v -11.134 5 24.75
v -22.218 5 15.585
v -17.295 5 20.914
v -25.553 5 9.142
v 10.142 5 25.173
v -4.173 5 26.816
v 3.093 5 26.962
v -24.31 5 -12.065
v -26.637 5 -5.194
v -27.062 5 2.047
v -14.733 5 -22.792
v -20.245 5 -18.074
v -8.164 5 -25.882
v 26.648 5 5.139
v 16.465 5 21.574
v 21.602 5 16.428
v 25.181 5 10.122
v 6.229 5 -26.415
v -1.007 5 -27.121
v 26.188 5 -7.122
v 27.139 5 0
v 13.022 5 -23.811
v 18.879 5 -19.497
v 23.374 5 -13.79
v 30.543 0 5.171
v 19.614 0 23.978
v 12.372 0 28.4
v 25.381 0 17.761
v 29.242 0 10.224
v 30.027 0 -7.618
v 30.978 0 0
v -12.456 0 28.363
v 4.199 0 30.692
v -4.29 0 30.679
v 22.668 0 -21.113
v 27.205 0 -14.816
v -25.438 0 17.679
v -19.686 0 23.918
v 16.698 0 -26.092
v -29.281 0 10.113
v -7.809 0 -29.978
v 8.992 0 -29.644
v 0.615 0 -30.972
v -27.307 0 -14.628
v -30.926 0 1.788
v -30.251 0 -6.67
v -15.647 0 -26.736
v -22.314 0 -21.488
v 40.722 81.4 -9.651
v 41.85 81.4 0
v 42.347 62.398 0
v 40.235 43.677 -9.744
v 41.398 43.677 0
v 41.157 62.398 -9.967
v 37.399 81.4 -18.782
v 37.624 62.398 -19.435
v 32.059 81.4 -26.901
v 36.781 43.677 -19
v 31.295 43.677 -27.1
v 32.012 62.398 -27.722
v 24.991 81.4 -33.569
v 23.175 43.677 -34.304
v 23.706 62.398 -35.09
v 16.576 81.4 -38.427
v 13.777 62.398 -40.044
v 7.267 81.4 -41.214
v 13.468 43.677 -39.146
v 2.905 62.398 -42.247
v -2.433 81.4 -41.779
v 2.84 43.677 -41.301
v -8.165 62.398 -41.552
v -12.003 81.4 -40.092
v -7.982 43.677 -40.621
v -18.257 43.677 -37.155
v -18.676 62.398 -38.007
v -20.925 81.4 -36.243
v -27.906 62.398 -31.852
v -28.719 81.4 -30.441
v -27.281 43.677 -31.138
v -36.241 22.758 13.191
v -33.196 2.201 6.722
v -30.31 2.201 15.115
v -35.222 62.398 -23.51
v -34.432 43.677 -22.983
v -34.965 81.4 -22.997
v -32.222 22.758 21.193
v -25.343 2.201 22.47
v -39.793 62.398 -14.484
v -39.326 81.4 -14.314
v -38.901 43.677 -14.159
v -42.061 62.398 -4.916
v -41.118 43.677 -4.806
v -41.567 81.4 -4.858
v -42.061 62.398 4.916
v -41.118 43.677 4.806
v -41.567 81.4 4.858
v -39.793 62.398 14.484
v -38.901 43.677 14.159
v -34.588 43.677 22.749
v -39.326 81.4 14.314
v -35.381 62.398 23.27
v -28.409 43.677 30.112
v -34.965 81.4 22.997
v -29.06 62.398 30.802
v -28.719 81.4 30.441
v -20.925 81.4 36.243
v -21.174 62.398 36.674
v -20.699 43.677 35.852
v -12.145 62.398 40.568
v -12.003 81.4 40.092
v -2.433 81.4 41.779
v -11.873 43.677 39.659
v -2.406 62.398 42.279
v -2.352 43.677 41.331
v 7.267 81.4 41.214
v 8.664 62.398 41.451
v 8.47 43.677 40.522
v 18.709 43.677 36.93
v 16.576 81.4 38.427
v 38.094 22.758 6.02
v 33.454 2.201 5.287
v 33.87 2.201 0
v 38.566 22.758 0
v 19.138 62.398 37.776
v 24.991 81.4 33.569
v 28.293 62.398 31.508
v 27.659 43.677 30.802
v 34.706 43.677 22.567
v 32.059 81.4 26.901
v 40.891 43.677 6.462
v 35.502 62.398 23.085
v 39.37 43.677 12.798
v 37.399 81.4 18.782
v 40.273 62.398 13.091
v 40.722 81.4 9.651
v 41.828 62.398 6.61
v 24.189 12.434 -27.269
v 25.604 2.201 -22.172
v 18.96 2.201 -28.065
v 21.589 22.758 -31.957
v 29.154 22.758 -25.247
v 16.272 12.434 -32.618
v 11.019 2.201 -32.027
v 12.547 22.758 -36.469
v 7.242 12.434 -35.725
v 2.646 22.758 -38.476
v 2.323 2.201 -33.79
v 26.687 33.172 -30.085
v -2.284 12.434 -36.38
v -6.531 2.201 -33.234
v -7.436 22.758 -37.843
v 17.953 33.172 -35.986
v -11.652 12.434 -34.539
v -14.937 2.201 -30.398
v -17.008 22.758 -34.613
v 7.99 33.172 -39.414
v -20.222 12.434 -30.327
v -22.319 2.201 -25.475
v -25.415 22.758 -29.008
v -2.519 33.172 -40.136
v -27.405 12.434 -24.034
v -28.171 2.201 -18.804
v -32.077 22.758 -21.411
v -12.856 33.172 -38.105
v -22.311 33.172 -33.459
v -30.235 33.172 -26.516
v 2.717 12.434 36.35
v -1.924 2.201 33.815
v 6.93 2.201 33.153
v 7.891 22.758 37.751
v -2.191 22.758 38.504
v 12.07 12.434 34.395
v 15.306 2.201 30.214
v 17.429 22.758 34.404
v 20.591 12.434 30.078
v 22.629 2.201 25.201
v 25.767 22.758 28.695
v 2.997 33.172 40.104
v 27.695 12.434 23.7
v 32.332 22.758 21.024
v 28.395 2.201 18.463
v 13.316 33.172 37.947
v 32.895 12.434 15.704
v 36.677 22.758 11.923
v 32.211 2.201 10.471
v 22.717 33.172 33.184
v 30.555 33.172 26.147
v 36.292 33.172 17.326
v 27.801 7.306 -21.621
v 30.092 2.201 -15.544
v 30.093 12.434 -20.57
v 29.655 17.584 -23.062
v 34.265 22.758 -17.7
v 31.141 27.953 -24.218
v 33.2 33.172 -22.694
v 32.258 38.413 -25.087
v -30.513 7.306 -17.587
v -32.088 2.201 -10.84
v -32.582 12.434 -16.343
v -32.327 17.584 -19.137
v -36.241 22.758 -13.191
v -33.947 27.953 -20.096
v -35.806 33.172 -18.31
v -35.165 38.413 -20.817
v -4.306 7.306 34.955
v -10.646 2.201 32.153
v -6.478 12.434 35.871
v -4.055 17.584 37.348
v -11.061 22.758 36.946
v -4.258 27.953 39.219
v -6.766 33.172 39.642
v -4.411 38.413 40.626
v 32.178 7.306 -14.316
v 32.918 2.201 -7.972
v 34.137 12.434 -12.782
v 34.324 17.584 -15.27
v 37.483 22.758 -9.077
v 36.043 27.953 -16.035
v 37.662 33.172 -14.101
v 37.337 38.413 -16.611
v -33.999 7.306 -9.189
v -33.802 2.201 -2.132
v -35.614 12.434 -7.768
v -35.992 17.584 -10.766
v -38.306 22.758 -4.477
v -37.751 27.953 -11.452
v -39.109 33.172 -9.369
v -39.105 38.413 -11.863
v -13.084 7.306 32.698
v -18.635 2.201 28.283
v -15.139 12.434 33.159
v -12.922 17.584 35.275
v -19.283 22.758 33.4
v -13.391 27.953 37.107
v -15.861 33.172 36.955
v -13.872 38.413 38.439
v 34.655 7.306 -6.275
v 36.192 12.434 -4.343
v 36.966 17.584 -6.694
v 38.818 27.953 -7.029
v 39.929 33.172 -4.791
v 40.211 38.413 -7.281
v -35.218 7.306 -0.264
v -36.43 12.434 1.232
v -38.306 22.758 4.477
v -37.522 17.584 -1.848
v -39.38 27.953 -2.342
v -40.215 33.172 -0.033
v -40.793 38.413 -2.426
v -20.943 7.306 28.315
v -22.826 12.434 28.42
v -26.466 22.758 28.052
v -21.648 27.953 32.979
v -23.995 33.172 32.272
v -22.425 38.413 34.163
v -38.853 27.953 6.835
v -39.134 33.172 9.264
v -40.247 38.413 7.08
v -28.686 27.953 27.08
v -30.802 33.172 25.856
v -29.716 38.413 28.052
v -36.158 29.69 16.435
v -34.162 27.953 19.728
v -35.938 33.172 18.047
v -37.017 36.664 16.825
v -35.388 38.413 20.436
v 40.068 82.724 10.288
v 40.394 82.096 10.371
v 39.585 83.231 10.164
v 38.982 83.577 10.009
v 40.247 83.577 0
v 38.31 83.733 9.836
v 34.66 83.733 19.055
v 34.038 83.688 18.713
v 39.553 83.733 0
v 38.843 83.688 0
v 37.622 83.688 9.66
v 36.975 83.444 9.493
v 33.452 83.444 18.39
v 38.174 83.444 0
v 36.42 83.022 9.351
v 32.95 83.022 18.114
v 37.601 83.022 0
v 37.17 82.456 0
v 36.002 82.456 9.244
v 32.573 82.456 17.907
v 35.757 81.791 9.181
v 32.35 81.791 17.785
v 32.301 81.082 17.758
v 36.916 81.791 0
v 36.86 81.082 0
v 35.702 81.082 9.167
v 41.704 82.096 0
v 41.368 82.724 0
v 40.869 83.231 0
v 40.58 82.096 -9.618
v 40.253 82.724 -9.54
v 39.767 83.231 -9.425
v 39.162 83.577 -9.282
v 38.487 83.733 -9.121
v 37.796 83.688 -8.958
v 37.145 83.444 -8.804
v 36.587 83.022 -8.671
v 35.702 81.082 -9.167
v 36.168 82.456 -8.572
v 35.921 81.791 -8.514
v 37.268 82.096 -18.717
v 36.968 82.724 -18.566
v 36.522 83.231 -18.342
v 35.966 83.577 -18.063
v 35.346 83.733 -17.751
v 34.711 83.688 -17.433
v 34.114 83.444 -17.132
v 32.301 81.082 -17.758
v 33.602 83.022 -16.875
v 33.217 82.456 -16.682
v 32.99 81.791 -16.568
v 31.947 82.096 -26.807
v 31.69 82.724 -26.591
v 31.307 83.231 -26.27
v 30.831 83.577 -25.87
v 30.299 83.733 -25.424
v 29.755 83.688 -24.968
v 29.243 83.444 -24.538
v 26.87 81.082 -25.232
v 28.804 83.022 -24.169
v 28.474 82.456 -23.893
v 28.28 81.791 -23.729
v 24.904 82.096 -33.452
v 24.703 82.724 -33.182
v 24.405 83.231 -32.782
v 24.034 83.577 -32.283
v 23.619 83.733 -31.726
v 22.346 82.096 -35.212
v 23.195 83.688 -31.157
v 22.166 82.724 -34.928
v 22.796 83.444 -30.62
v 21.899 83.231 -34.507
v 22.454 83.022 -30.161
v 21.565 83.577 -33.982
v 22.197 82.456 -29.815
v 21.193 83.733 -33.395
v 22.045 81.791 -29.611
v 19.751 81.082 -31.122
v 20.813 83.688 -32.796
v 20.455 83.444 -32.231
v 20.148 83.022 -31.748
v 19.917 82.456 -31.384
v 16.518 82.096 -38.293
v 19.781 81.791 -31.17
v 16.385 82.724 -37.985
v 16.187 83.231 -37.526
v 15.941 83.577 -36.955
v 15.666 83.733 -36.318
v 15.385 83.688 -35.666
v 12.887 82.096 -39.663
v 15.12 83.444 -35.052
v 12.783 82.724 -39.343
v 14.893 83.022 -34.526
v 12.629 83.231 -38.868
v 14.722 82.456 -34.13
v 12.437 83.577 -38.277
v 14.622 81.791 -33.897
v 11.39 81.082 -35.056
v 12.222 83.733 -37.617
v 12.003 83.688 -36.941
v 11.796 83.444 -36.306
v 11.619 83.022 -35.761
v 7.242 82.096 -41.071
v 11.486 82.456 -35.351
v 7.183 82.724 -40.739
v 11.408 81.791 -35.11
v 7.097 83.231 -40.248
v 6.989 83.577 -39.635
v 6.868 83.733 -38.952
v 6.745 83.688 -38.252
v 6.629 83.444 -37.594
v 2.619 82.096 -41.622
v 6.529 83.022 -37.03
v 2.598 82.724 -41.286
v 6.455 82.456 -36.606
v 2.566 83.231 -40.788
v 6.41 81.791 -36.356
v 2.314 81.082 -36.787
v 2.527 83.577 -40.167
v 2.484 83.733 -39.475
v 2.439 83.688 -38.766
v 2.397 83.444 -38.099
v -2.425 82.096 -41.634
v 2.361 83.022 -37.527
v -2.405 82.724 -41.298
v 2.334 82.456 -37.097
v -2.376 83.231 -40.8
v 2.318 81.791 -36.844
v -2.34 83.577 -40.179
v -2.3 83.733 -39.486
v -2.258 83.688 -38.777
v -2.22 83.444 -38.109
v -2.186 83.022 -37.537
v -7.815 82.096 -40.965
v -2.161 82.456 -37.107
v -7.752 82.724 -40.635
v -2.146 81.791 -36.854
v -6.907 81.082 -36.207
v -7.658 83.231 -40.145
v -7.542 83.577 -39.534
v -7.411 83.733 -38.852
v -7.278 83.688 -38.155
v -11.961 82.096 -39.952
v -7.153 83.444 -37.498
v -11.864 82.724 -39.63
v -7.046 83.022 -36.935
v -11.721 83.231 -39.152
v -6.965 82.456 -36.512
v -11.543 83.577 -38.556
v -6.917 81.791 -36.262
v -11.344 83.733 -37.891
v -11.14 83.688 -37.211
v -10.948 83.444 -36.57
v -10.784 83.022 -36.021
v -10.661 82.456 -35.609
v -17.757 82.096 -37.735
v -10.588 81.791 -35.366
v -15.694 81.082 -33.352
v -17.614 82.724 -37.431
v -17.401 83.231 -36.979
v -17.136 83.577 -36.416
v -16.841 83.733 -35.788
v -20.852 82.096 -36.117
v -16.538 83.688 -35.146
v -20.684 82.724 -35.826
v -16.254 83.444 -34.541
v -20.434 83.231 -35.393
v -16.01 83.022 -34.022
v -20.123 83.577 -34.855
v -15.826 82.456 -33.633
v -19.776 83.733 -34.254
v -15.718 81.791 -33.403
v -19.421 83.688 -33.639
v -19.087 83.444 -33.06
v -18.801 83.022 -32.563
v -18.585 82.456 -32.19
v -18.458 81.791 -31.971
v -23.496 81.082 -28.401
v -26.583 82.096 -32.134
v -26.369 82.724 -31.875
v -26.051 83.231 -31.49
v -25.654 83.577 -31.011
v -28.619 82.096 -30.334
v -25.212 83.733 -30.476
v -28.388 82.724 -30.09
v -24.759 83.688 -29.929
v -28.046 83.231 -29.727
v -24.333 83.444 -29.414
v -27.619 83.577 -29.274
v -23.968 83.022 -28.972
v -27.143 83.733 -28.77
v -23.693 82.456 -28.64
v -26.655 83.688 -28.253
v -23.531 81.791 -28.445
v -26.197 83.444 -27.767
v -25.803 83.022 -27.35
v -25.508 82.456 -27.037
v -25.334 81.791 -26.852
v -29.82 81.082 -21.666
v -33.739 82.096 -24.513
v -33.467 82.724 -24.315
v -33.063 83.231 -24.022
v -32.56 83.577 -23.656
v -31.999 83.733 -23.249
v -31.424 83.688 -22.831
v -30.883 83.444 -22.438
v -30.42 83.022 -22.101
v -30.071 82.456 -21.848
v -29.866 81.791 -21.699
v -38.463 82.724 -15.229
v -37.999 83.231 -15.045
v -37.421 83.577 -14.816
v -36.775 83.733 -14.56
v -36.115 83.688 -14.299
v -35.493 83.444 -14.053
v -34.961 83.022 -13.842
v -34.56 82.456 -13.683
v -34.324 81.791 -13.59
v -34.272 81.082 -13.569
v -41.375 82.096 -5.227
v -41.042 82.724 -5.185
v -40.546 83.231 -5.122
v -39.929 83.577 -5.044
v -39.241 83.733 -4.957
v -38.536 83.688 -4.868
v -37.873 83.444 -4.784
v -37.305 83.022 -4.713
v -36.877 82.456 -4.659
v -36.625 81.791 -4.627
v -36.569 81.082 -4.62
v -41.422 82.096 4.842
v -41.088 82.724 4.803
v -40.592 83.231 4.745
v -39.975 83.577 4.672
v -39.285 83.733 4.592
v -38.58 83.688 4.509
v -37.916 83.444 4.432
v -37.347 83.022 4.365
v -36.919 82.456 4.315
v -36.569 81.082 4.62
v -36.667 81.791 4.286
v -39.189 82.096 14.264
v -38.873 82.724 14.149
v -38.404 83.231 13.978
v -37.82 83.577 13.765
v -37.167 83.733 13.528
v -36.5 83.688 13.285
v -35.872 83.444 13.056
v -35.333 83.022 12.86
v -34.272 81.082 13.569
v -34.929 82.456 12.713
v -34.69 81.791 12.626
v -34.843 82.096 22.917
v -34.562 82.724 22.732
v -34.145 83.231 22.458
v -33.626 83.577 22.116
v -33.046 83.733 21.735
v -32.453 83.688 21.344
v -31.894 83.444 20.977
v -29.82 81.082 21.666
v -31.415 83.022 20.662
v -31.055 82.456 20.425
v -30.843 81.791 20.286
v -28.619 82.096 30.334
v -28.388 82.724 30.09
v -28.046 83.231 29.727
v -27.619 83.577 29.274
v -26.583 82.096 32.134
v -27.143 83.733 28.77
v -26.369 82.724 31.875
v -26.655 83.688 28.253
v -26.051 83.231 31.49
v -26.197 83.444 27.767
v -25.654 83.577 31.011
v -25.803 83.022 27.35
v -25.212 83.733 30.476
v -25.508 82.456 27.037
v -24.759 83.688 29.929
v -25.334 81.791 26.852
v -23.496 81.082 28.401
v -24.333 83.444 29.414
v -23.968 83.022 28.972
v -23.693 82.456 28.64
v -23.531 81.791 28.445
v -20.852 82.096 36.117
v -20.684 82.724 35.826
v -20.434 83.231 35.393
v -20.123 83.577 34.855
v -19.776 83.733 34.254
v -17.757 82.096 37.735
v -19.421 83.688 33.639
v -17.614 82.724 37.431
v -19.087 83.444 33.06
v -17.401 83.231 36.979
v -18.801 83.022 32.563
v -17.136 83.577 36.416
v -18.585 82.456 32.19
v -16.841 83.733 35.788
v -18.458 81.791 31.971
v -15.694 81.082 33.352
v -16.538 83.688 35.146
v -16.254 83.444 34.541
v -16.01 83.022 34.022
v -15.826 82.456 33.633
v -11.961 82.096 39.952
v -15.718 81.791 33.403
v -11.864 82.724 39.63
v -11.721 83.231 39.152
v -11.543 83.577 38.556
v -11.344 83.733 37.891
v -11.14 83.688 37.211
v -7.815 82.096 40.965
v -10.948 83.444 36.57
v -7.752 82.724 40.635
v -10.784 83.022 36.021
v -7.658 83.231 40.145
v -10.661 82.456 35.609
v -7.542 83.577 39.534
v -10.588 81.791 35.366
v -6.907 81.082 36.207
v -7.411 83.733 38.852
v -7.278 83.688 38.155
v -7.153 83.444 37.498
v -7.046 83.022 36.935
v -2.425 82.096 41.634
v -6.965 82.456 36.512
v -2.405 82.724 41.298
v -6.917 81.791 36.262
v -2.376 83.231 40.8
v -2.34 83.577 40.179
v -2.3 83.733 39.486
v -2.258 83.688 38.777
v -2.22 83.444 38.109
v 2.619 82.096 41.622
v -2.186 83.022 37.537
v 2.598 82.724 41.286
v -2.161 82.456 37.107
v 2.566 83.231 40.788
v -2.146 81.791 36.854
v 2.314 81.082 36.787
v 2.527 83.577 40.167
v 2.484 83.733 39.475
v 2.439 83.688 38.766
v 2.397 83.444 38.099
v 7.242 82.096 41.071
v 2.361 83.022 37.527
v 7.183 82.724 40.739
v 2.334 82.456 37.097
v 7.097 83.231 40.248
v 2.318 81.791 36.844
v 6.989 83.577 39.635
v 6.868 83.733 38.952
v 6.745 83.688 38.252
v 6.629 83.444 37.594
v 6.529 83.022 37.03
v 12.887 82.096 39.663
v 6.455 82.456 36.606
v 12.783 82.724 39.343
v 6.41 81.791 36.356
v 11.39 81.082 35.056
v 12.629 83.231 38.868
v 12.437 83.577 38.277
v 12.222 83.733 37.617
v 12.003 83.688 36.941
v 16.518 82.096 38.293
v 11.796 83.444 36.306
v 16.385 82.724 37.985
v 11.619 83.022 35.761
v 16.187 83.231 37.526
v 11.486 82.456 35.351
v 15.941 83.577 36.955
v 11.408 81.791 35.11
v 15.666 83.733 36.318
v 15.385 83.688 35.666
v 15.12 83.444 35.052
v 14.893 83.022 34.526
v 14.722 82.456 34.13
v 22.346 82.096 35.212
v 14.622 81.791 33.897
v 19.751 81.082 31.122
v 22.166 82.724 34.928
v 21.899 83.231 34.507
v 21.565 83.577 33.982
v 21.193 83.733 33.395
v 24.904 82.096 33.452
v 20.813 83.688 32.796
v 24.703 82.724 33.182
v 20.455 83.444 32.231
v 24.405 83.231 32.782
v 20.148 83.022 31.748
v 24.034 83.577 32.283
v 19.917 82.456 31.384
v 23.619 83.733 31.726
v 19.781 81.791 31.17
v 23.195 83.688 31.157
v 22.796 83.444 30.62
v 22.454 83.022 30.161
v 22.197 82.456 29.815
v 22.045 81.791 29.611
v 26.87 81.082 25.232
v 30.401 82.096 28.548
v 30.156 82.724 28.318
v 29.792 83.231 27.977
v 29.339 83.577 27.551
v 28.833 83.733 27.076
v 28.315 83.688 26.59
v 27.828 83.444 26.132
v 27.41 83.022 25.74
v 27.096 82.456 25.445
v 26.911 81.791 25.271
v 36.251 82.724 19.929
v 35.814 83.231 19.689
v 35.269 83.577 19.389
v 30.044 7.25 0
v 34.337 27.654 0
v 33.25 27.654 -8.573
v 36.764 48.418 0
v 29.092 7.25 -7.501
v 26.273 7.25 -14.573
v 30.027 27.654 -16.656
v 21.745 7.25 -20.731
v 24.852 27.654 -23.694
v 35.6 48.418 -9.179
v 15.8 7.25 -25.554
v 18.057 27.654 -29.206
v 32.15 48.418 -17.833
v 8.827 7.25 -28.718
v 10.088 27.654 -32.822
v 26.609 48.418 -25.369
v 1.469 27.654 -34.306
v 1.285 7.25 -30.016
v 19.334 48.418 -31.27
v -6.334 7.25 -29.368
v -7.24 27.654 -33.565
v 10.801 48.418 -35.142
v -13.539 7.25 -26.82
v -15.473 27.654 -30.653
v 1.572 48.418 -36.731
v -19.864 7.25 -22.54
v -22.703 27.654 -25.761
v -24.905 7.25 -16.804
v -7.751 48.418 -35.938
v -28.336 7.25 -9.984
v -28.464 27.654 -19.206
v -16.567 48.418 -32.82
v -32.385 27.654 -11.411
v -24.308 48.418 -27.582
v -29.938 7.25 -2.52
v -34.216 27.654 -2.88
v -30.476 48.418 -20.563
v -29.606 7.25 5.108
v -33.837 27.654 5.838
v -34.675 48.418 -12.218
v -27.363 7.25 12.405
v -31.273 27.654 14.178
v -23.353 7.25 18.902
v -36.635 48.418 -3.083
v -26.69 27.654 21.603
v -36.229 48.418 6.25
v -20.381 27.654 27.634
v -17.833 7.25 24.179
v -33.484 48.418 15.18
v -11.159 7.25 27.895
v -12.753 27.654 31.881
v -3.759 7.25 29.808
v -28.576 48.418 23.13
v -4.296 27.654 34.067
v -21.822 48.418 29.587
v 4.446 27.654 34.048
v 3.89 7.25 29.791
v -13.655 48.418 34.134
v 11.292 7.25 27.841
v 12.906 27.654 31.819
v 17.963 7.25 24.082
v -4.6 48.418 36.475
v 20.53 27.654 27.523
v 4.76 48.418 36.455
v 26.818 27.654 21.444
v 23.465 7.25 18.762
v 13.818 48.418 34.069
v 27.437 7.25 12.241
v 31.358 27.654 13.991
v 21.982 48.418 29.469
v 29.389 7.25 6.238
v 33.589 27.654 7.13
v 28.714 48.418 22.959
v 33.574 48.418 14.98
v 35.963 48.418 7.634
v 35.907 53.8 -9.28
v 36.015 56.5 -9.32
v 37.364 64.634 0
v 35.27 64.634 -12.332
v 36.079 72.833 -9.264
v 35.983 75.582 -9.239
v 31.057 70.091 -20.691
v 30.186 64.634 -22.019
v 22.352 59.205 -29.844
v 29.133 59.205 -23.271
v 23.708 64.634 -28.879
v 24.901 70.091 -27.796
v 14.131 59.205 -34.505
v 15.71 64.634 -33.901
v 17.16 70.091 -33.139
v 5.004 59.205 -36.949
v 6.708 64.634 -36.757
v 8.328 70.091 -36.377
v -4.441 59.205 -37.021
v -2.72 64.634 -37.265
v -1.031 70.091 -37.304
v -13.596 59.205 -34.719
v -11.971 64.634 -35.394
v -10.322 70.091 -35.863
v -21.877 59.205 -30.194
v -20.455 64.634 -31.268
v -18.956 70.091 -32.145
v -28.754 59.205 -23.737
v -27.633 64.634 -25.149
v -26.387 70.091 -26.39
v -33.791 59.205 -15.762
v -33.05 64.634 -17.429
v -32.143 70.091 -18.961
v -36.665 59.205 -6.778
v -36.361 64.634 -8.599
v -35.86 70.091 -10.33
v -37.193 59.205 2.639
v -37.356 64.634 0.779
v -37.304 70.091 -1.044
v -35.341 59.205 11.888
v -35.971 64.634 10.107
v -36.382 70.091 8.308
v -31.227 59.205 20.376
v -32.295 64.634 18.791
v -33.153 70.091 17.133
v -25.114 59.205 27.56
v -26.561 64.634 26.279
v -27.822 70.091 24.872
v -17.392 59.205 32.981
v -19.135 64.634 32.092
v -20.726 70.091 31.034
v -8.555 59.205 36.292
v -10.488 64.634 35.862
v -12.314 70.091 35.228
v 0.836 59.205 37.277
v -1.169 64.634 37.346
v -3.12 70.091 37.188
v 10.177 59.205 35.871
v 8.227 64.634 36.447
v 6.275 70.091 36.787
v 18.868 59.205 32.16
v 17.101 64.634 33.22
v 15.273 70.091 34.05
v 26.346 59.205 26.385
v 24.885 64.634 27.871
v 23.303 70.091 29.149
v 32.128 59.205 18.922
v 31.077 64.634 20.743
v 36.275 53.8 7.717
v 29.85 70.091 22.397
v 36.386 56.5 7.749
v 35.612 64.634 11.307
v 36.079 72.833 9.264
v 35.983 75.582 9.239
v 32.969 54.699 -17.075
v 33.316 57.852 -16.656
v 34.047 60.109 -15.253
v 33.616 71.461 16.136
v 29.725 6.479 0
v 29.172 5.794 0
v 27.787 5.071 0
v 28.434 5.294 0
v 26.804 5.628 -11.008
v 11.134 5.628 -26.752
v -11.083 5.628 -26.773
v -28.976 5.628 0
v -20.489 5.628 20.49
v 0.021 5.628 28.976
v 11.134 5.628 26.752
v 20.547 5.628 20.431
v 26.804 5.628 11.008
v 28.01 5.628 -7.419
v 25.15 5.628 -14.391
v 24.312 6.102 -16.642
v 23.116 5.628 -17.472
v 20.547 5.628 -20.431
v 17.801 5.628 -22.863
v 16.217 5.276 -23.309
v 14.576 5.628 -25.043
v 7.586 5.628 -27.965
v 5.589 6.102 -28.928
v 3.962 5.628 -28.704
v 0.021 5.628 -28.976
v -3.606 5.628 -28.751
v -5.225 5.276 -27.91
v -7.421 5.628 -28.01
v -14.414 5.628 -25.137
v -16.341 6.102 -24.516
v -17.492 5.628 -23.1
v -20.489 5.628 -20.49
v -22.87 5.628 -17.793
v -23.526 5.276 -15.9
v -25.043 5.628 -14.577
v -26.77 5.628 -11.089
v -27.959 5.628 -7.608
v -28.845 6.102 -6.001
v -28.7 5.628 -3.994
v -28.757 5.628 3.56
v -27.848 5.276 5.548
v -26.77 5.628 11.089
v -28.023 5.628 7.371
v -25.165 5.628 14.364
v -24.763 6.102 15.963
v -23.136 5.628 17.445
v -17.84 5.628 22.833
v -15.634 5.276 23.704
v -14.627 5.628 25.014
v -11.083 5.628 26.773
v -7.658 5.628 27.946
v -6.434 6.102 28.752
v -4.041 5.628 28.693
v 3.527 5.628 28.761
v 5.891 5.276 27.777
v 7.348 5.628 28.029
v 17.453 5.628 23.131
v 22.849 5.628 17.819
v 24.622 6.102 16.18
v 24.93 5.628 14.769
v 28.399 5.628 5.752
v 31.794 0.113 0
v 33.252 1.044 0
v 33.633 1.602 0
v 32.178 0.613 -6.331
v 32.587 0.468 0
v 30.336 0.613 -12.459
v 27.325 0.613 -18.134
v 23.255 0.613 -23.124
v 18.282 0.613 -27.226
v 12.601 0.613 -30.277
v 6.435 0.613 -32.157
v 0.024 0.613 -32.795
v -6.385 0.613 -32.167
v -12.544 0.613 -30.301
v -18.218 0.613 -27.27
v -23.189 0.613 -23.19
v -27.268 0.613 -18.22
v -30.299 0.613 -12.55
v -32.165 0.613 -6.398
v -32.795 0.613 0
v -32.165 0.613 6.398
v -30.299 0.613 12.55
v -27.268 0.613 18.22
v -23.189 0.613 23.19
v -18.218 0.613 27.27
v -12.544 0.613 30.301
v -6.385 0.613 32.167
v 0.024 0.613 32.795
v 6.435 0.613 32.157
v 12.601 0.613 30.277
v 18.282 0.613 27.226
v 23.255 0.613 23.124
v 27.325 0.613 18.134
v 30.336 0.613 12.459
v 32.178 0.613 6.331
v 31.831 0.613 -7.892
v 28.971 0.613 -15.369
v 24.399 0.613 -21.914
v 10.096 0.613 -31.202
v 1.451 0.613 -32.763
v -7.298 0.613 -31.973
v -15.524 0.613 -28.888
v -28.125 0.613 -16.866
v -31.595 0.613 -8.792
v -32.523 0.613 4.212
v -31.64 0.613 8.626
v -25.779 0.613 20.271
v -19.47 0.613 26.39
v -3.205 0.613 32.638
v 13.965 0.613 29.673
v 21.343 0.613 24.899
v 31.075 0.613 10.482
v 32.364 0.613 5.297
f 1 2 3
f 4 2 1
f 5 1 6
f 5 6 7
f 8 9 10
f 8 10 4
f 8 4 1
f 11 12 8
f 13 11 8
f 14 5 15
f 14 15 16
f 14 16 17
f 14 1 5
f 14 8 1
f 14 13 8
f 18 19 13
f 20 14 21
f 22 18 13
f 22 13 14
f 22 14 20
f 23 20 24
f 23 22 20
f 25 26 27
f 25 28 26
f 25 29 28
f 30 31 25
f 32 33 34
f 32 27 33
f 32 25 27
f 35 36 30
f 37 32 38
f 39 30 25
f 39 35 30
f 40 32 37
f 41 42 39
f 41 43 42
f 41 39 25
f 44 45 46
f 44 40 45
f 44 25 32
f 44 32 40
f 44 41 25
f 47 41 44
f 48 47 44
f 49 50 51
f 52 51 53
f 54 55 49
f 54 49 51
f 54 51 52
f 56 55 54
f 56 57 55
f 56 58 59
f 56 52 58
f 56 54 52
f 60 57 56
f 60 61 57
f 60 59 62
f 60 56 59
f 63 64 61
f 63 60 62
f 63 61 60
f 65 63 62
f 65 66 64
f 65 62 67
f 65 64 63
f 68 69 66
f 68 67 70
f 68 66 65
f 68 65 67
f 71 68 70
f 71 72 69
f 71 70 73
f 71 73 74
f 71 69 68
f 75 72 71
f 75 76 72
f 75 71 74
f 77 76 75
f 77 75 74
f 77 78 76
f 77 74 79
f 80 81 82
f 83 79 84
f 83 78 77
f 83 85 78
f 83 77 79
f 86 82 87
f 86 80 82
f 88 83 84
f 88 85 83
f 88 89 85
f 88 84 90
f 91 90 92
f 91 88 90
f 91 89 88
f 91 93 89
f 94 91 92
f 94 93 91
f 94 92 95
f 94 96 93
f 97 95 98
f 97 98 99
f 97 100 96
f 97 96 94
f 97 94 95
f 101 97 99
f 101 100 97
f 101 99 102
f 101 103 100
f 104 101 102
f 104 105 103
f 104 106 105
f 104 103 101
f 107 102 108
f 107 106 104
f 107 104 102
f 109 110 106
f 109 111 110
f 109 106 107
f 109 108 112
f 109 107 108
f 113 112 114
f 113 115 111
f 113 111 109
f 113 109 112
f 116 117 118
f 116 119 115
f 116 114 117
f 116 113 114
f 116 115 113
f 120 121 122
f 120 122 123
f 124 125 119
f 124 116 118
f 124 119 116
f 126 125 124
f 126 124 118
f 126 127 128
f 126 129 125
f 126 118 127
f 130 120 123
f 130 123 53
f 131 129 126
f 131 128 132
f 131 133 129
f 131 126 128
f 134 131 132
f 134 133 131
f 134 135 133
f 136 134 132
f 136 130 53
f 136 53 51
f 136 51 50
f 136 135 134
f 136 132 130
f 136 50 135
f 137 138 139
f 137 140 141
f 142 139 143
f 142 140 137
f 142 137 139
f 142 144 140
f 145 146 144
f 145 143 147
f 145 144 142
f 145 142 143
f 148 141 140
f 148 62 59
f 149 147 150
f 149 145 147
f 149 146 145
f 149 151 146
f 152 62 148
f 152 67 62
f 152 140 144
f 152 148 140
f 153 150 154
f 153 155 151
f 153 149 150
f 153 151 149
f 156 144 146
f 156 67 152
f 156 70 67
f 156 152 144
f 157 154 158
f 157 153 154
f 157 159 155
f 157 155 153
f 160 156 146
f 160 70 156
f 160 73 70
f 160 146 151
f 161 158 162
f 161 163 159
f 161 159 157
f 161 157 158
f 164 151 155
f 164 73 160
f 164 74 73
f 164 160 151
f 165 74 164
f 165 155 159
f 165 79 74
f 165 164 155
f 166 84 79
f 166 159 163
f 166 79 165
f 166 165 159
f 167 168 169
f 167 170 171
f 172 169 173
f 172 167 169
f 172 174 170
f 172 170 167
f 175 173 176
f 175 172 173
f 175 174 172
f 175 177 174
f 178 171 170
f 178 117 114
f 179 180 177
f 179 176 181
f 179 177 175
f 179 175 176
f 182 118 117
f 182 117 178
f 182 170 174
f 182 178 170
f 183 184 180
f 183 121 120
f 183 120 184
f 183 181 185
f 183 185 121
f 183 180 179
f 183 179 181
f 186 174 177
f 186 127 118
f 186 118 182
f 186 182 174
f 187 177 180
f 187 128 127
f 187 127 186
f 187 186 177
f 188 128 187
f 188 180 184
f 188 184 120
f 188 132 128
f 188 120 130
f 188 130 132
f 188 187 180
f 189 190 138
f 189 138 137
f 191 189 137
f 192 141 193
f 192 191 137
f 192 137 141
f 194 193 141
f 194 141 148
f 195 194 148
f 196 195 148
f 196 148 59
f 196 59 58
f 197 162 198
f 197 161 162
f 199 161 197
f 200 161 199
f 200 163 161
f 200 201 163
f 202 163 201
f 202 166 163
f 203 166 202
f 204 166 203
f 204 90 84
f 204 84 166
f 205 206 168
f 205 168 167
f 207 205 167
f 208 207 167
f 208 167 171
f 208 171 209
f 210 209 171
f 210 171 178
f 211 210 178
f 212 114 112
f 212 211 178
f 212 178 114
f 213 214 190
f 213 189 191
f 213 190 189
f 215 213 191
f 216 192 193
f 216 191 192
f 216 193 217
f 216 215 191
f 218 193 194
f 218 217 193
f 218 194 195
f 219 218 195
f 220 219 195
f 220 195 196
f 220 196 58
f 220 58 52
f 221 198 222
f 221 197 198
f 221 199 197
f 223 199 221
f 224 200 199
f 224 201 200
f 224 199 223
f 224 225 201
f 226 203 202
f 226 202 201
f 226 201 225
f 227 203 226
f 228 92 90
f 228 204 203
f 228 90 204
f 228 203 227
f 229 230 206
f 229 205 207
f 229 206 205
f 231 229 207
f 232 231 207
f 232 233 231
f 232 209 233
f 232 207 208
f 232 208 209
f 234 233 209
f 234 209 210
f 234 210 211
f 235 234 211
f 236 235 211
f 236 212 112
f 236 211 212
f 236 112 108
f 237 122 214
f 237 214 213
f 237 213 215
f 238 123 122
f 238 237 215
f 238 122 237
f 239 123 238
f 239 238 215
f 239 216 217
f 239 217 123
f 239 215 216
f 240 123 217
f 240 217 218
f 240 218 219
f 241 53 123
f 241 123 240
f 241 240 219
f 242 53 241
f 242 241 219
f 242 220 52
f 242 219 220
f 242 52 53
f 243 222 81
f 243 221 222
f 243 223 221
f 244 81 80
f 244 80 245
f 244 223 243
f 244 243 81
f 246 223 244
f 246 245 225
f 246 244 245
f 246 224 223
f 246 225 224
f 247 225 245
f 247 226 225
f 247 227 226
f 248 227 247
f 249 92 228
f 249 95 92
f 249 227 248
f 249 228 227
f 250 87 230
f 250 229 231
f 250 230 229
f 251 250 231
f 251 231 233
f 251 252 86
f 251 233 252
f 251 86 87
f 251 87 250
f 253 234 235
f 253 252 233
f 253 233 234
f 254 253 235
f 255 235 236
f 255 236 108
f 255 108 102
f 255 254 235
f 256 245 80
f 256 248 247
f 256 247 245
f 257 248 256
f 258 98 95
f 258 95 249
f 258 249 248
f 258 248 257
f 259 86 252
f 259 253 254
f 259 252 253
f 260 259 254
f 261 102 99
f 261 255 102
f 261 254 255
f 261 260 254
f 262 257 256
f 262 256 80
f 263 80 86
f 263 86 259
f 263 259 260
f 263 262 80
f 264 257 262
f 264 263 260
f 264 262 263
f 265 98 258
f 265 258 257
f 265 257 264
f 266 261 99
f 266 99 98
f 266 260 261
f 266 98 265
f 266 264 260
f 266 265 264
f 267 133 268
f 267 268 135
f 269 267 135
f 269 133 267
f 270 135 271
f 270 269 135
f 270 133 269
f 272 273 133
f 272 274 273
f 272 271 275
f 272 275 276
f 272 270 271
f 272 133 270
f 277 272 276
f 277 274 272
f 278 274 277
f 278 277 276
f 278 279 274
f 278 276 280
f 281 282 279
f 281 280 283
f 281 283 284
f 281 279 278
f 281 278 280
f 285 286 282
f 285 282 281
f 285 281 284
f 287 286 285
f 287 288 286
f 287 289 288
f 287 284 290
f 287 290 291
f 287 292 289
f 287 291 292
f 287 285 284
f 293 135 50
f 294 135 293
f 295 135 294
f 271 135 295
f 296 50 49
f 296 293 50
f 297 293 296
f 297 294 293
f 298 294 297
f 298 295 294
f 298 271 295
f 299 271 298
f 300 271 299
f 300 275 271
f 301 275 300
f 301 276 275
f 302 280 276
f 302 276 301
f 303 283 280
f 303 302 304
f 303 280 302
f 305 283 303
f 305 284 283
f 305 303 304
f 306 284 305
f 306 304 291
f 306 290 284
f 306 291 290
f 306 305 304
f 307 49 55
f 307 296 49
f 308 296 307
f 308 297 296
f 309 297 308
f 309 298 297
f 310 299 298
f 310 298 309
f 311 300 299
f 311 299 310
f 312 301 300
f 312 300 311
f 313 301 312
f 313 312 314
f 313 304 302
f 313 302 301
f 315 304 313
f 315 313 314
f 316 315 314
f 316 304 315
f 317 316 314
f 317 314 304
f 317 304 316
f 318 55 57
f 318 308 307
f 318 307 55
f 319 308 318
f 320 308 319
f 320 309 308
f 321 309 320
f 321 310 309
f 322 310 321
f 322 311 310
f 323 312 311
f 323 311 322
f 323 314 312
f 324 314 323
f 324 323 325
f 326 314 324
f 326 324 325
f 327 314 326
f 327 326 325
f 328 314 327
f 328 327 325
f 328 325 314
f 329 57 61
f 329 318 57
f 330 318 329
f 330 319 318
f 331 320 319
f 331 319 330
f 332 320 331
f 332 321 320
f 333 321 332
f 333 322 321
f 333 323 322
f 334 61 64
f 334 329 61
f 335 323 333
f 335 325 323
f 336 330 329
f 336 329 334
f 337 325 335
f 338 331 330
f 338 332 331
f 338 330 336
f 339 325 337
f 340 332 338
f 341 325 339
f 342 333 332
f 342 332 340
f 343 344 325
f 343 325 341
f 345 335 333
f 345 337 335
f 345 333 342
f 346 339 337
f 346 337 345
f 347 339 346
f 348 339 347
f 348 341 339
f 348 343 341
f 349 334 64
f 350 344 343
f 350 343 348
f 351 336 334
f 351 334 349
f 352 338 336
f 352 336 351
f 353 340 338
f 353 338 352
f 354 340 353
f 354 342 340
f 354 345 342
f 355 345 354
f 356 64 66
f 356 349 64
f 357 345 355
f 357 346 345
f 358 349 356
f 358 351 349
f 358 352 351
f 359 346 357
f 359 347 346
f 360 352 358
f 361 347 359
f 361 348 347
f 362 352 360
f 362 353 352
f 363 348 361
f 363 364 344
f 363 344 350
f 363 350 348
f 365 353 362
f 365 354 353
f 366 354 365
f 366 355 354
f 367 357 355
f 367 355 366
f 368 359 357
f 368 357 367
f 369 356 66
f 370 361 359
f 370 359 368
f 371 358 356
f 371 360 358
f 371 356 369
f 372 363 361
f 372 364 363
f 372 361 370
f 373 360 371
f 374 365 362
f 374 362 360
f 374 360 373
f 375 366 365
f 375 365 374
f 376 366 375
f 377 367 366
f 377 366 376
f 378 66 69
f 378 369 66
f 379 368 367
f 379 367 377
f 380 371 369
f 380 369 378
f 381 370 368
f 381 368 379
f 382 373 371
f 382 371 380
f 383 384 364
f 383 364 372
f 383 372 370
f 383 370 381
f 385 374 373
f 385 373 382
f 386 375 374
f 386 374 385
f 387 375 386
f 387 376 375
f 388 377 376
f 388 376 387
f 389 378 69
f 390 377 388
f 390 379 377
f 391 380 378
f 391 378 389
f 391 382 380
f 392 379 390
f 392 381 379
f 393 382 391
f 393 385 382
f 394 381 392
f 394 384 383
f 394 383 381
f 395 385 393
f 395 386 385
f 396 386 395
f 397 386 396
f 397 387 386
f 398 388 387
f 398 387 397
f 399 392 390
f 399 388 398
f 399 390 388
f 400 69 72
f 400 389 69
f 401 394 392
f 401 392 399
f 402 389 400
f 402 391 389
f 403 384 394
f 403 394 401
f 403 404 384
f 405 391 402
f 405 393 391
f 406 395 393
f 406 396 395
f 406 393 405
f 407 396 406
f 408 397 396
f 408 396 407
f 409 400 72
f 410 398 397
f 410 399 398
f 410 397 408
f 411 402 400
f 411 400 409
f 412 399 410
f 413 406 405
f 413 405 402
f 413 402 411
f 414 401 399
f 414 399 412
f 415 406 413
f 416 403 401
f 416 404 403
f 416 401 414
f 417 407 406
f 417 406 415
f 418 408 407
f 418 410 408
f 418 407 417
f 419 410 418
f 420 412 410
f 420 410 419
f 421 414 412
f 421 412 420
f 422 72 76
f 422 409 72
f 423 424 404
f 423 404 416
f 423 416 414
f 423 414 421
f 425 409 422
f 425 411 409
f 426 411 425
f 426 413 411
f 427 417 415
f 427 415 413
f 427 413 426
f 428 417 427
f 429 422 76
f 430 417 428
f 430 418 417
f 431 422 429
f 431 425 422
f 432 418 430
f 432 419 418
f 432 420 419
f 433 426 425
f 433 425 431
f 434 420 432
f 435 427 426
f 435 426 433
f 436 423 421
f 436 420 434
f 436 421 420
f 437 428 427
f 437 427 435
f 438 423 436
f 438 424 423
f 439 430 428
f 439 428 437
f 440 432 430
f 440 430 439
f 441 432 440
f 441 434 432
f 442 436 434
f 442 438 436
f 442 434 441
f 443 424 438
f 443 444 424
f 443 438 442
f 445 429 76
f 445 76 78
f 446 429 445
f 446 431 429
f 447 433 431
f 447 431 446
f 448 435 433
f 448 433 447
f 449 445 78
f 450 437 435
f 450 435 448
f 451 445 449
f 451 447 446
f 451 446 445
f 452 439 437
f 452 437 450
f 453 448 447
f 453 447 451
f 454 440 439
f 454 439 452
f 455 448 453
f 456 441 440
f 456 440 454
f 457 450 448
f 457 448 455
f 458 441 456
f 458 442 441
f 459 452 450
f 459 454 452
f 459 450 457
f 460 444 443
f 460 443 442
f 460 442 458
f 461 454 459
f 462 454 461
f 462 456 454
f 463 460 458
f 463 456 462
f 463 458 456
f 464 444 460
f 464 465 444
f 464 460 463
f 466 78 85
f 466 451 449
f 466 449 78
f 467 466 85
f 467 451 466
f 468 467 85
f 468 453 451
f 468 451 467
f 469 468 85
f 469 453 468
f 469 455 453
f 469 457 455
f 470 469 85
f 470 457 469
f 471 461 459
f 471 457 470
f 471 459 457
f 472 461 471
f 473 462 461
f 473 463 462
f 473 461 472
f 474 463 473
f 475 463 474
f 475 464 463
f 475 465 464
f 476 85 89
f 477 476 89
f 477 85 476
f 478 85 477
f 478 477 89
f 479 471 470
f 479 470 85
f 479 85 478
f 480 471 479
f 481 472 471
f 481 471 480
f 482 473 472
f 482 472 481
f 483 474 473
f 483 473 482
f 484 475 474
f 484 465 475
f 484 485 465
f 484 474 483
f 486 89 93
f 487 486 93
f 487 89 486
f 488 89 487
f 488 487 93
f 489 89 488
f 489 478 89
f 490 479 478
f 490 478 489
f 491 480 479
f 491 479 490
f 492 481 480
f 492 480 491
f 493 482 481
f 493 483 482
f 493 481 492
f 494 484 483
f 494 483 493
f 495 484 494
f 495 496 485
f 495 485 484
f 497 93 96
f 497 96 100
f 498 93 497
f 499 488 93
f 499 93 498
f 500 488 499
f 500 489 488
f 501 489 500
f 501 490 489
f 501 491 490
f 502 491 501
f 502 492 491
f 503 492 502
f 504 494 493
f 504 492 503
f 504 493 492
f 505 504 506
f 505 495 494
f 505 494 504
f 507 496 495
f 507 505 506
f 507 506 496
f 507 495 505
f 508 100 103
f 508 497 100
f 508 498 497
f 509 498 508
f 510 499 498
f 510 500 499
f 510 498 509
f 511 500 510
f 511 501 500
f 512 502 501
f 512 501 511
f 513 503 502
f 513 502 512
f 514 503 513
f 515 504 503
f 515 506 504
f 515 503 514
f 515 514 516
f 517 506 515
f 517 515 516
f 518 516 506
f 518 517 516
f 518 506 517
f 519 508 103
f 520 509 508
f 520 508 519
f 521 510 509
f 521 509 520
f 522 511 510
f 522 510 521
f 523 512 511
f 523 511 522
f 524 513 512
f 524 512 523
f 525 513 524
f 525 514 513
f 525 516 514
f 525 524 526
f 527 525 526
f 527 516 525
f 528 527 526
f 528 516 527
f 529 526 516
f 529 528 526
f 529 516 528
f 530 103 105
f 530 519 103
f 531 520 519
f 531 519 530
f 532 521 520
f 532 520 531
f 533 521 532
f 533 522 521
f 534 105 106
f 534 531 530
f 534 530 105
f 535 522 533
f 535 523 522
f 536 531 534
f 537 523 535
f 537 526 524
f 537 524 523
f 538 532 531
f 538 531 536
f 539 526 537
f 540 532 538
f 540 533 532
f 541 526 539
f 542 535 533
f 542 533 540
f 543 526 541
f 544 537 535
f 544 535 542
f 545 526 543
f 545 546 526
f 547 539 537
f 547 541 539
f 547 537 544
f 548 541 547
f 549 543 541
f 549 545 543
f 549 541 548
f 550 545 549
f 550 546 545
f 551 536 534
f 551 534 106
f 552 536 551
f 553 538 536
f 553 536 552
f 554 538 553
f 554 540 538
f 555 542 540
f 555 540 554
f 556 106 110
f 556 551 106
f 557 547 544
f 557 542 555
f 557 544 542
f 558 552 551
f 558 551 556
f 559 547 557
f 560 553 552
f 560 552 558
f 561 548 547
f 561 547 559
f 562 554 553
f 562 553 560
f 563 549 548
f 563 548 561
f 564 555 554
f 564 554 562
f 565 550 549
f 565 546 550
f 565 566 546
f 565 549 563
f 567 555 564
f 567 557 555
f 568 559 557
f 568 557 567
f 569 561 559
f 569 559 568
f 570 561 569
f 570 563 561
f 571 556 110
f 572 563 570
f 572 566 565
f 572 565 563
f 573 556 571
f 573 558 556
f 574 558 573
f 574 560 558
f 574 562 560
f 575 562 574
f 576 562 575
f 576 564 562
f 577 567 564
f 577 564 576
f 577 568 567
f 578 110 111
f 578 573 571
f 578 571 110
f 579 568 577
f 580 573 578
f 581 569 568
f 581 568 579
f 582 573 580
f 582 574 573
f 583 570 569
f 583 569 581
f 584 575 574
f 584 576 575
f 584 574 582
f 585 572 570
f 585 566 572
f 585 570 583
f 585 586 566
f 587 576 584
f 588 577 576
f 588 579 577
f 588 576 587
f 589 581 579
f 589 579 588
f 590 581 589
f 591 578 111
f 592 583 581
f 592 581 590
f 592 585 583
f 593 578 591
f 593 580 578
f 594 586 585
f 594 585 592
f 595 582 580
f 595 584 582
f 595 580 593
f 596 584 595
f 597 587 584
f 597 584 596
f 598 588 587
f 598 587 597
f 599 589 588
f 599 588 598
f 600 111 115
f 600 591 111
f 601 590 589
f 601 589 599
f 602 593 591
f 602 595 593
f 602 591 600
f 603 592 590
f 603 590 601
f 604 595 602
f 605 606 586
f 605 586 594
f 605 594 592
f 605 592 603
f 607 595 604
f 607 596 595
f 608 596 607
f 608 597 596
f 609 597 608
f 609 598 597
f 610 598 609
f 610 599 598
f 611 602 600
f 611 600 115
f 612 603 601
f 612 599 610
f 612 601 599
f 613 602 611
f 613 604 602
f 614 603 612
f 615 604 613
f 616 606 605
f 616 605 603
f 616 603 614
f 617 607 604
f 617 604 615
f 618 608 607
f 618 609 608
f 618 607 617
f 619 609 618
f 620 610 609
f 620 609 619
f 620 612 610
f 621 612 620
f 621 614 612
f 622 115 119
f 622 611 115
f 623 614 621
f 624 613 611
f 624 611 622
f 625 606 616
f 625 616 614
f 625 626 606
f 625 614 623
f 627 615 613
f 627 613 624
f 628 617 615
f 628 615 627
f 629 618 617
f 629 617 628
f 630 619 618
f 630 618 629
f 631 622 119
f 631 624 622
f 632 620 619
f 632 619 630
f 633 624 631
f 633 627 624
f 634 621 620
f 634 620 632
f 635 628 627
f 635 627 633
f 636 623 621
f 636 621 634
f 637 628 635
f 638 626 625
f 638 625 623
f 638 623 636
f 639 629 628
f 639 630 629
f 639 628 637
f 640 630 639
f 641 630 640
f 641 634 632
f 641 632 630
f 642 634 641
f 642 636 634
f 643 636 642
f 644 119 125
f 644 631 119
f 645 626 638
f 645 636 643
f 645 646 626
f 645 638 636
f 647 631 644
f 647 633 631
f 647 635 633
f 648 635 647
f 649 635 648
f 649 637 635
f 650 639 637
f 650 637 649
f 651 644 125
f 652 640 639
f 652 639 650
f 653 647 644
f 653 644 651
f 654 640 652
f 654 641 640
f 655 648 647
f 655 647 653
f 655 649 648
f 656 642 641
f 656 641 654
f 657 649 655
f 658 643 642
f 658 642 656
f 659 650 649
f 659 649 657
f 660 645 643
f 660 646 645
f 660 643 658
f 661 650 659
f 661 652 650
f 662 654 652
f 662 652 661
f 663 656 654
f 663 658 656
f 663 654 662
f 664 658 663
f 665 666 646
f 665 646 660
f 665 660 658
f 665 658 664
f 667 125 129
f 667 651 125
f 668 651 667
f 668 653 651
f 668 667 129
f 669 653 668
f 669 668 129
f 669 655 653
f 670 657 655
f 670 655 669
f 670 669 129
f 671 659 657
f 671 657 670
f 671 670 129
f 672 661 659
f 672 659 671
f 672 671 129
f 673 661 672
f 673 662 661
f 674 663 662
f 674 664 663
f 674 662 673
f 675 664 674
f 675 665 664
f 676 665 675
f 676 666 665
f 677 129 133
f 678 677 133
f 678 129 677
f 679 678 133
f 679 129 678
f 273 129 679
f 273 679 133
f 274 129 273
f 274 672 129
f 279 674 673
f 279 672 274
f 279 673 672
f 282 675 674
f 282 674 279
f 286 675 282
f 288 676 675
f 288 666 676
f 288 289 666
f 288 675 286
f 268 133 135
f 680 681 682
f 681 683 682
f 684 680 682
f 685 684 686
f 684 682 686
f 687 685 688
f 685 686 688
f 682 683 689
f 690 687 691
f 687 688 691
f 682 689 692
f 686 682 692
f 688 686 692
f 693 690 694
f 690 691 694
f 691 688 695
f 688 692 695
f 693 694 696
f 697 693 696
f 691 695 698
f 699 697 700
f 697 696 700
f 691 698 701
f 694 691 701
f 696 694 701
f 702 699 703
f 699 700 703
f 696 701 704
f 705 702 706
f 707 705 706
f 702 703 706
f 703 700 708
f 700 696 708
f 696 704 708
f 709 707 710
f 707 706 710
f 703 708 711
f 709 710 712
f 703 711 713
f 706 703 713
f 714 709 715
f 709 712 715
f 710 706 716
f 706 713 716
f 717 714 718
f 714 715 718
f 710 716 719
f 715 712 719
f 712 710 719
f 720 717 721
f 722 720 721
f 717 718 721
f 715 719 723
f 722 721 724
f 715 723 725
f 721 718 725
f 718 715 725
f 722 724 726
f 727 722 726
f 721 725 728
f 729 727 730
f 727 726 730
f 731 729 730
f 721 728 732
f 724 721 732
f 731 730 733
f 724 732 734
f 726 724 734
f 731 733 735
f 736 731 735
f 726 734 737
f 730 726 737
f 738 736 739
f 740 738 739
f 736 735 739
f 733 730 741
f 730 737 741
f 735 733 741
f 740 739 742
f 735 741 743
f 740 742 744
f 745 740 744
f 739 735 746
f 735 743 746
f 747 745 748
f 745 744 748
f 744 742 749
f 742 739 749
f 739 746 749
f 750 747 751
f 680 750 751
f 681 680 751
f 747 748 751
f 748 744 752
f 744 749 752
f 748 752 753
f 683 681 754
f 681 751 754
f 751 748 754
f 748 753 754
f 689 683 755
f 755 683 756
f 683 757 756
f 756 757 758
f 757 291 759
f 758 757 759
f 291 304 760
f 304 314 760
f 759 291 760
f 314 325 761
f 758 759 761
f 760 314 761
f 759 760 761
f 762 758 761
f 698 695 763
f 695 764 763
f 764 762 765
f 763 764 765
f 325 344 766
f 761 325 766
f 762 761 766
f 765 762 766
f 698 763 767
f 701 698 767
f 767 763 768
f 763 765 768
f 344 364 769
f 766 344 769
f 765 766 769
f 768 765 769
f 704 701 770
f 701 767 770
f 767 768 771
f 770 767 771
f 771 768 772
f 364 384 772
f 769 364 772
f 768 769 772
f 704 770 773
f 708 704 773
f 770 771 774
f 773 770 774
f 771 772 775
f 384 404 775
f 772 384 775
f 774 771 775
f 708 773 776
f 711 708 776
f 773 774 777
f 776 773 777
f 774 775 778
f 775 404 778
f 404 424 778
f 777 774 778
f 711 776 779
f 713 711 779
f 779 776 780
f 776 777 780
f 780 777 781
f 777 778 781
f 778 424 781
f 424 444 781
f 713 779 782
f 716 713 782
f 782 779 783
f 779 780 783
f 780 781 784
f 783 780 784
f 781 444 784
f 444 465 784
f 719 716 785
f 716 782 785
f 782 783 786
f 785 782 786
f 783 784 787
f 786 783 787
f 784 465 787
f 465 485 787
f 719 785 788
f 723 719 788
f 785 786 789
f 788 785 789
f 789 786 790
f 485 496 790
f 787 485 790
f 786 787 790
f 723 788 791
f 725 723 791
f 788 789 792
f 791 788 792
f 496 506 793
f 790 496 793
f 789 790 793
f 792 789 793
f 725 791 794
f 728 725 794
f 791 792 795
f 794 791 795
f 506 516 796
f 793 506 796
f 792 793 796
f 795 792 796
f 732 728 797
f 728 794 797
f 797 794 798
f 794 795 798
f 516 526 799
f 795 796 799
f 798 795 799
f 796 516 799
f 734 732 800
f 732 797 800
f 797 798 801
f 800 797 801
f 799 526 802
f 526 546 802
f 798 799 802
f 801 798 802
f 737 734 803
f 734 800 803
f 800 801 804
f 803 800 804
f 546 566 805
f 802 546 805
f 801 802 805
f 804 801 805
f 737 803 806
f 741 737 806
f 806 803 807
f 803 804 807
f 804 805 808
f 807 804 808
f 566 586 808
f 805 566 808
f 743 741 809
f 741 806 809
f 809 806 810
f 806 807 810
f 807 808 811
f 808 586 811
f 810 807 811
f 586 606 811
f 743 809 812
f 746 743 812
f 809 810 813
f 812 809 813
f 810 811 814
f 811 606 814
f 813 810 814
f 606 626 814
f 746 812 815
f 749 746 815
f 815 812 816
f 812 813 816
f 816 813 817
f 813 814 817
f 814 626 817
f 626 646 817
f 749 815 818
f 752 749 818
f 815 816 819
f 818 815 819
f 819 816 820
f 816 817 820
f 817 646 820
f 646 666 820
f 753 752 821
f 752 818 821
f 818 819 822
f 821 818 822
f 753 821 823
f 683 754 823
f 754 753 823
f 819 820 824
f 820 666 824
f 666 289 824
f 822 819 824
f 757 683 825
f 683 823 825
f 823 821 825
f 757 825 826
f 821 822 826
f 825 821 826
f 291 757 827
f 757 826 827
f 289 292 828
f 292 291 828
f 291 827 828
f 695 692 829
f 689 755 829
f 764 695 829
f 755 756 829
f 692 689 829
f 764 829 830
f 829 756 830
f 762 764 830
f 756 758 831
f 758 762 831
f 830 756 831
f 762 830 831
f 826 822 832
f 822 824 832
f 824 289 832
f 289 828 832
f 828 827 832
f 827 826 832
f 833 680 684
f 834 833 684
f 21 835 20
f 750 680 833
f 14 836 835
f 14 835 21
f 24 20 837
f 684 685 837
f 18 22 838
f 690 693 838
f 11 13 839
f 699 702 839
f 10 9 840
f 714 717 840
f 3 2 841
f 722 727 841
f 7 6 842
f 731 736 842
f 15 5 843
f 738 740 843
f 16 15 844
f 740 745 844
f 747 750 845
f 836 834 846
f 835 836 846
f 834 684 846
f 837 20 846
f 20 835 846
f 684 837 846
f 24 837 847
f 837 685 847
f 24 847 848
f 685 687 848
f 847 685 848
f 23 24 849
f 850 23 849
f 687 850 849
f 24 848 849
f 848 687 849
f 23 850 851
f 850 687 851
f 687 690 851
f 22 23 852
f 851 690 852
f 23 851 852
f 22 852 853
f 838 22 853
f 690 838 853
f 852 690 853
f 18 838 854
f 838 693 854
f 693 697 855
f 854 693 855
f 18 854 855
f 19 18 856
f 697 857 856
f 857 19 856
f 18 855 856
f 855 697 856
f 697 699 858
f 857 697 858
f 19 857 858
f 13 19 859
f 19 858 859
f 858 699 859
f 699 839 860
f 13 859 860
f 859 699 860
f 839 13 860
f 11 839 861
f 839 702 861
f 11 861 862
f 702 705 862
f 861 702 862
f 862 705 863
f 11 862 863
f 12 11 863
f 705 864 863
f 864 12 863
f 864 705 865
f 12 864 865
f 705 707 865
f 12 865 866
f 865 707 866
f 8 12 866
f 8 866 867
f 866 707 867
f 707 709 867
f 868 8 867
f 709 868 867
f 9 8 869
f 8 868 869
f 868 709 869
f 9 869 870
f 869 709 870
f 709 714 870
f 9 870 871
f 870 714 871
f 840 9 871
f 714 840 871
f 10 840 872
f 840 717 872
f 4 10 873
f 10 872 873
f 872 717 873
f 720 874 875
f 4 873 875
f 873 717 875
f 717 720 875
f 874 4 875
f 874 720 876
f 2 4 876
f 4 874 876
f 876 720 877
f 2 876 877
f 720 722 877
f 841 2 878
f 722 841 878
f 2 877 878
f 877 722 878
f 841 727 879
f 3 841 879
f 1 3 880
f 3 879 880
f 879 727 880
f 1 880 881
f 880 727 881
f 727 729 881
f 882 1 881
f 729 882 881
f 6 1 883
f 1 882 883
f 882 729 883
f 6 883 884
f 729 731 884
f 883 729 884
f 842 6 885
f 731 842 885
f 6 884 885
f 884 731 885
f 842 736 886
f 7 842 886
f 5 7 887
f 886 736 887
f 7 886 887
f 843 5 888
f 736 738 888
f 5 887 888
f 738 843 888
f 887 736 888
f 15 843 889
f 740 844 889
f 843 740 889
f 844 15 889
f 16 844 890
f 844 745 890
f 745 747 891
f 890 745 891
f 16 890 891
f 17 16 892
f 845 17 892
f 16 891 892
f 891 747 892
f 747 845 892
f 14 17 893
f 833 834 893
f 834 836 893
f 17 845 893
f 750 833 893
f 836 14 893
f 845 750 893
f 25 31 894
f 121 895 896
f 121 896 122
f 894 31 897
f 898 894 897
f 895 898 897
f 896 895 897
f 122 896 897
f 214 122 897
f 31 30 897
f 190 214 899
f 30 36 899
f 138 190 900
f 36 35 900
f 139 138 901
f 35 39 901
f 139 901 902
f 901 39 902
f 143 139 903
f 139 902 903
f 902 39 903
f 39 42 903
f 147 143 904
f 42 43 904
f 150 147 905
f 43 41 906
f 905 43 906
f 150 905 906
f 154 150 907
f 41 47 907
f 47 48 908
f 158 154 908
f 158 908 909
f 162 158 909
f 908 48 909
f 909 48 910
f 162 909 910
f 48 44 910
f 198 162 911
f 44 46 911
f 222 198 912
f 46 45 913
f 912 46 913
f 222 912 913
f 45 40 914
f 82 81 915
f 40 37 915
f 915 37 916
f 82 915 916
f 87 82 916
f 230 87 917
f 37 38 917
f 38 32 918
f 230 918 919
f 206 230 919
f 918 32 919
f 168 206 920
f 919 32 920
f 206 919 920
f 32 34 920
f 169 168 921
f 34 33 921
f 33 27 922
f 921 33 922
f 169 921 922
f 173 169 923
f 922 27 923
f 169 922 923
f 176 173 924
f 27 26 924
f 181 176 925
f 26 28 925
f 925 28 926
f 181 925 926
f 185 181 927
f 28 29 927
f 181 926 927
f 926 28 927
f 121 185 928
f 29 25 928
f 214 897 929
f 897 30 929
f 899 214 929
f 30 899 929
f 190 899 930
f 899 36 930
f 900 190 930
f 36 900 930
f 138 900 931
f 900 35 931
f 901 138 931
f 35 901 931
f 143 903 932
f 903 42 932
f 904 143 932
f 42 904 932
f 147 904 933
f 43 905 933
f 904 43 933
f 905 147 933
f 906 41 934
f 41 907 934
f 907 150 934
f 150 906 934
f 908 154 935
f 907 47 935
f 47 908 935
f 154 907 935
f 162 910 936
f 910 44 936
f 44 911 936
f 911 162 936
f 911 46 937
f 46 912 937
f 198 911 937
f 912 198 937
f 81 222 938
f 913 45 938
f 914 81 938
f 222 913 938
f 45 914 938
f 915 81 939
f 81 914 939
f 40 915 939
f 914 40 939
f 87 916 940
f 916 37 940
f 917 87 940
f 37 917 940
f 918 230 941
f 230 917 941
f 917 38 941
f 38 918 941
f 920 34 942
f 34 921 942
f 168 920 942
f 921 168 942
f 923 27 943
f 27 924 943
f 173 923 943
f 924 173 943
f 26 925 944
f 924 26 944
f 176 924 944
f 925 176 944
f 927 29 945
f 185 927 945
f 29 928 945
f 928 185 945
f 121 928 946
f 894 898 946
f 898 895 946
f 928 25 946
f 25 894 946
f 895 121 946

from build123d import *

# Parameters (mm, degrees)
FILLET1_R = 3


with BuildPart() as part:
    # Sketch1 → Revolve1 (revolve)
    with BuildSketch(Plane.XY):
        with BuildLine():
            Line((0, 0), (33.25, 0))
            add(Edge.make_bspline(
                [(33.25, 0), (40.770585082, 26.227397042), (43.637251749, 53.360730375), (41.85, 81.4)],
                knots=[0, 0, 0, 0, 1, 1, 1, 1], degree=3))
            ThreePointArc((41.85, 81.4), (39.1960334, 83.735906952), (36.860126448, 81.081940352))
            add(Edge.make_bspline(
                [(29.450423152, 5), (31.098721331, 11.122731195), (33.890065025, 23.513467046), (36.51627774, 42.362705396), (37.414431967, 58.346354897), (37.357321389, 71.274458443), (37.067836742, 77.823280829), (36.860126448, 81.081940352)],
                knots=[0.046951369, 0.046951369, 0.046951369, 0.046951369, 0.285213527, 0.523475685, 0.761737842, 0.880868921, 1, 1, 1, 1], degree=3))
            Line((29.450423152, 5), (0, 5))
            Line((0, 5), (0, 0))
        make_face()
    revolve(axis=Axis((0, 0, 0), (0, 1, 0)))

    # Fillet1
    fillet1_edges = [part.edges().sort_by_distance(p)[0] for p in [
        (-33.25, 0, 0),
        (-29.450423152, 5, 0),
    ]]
    fillet(fillet1_edges, radius=FILLET1_R)


solid = part.part
